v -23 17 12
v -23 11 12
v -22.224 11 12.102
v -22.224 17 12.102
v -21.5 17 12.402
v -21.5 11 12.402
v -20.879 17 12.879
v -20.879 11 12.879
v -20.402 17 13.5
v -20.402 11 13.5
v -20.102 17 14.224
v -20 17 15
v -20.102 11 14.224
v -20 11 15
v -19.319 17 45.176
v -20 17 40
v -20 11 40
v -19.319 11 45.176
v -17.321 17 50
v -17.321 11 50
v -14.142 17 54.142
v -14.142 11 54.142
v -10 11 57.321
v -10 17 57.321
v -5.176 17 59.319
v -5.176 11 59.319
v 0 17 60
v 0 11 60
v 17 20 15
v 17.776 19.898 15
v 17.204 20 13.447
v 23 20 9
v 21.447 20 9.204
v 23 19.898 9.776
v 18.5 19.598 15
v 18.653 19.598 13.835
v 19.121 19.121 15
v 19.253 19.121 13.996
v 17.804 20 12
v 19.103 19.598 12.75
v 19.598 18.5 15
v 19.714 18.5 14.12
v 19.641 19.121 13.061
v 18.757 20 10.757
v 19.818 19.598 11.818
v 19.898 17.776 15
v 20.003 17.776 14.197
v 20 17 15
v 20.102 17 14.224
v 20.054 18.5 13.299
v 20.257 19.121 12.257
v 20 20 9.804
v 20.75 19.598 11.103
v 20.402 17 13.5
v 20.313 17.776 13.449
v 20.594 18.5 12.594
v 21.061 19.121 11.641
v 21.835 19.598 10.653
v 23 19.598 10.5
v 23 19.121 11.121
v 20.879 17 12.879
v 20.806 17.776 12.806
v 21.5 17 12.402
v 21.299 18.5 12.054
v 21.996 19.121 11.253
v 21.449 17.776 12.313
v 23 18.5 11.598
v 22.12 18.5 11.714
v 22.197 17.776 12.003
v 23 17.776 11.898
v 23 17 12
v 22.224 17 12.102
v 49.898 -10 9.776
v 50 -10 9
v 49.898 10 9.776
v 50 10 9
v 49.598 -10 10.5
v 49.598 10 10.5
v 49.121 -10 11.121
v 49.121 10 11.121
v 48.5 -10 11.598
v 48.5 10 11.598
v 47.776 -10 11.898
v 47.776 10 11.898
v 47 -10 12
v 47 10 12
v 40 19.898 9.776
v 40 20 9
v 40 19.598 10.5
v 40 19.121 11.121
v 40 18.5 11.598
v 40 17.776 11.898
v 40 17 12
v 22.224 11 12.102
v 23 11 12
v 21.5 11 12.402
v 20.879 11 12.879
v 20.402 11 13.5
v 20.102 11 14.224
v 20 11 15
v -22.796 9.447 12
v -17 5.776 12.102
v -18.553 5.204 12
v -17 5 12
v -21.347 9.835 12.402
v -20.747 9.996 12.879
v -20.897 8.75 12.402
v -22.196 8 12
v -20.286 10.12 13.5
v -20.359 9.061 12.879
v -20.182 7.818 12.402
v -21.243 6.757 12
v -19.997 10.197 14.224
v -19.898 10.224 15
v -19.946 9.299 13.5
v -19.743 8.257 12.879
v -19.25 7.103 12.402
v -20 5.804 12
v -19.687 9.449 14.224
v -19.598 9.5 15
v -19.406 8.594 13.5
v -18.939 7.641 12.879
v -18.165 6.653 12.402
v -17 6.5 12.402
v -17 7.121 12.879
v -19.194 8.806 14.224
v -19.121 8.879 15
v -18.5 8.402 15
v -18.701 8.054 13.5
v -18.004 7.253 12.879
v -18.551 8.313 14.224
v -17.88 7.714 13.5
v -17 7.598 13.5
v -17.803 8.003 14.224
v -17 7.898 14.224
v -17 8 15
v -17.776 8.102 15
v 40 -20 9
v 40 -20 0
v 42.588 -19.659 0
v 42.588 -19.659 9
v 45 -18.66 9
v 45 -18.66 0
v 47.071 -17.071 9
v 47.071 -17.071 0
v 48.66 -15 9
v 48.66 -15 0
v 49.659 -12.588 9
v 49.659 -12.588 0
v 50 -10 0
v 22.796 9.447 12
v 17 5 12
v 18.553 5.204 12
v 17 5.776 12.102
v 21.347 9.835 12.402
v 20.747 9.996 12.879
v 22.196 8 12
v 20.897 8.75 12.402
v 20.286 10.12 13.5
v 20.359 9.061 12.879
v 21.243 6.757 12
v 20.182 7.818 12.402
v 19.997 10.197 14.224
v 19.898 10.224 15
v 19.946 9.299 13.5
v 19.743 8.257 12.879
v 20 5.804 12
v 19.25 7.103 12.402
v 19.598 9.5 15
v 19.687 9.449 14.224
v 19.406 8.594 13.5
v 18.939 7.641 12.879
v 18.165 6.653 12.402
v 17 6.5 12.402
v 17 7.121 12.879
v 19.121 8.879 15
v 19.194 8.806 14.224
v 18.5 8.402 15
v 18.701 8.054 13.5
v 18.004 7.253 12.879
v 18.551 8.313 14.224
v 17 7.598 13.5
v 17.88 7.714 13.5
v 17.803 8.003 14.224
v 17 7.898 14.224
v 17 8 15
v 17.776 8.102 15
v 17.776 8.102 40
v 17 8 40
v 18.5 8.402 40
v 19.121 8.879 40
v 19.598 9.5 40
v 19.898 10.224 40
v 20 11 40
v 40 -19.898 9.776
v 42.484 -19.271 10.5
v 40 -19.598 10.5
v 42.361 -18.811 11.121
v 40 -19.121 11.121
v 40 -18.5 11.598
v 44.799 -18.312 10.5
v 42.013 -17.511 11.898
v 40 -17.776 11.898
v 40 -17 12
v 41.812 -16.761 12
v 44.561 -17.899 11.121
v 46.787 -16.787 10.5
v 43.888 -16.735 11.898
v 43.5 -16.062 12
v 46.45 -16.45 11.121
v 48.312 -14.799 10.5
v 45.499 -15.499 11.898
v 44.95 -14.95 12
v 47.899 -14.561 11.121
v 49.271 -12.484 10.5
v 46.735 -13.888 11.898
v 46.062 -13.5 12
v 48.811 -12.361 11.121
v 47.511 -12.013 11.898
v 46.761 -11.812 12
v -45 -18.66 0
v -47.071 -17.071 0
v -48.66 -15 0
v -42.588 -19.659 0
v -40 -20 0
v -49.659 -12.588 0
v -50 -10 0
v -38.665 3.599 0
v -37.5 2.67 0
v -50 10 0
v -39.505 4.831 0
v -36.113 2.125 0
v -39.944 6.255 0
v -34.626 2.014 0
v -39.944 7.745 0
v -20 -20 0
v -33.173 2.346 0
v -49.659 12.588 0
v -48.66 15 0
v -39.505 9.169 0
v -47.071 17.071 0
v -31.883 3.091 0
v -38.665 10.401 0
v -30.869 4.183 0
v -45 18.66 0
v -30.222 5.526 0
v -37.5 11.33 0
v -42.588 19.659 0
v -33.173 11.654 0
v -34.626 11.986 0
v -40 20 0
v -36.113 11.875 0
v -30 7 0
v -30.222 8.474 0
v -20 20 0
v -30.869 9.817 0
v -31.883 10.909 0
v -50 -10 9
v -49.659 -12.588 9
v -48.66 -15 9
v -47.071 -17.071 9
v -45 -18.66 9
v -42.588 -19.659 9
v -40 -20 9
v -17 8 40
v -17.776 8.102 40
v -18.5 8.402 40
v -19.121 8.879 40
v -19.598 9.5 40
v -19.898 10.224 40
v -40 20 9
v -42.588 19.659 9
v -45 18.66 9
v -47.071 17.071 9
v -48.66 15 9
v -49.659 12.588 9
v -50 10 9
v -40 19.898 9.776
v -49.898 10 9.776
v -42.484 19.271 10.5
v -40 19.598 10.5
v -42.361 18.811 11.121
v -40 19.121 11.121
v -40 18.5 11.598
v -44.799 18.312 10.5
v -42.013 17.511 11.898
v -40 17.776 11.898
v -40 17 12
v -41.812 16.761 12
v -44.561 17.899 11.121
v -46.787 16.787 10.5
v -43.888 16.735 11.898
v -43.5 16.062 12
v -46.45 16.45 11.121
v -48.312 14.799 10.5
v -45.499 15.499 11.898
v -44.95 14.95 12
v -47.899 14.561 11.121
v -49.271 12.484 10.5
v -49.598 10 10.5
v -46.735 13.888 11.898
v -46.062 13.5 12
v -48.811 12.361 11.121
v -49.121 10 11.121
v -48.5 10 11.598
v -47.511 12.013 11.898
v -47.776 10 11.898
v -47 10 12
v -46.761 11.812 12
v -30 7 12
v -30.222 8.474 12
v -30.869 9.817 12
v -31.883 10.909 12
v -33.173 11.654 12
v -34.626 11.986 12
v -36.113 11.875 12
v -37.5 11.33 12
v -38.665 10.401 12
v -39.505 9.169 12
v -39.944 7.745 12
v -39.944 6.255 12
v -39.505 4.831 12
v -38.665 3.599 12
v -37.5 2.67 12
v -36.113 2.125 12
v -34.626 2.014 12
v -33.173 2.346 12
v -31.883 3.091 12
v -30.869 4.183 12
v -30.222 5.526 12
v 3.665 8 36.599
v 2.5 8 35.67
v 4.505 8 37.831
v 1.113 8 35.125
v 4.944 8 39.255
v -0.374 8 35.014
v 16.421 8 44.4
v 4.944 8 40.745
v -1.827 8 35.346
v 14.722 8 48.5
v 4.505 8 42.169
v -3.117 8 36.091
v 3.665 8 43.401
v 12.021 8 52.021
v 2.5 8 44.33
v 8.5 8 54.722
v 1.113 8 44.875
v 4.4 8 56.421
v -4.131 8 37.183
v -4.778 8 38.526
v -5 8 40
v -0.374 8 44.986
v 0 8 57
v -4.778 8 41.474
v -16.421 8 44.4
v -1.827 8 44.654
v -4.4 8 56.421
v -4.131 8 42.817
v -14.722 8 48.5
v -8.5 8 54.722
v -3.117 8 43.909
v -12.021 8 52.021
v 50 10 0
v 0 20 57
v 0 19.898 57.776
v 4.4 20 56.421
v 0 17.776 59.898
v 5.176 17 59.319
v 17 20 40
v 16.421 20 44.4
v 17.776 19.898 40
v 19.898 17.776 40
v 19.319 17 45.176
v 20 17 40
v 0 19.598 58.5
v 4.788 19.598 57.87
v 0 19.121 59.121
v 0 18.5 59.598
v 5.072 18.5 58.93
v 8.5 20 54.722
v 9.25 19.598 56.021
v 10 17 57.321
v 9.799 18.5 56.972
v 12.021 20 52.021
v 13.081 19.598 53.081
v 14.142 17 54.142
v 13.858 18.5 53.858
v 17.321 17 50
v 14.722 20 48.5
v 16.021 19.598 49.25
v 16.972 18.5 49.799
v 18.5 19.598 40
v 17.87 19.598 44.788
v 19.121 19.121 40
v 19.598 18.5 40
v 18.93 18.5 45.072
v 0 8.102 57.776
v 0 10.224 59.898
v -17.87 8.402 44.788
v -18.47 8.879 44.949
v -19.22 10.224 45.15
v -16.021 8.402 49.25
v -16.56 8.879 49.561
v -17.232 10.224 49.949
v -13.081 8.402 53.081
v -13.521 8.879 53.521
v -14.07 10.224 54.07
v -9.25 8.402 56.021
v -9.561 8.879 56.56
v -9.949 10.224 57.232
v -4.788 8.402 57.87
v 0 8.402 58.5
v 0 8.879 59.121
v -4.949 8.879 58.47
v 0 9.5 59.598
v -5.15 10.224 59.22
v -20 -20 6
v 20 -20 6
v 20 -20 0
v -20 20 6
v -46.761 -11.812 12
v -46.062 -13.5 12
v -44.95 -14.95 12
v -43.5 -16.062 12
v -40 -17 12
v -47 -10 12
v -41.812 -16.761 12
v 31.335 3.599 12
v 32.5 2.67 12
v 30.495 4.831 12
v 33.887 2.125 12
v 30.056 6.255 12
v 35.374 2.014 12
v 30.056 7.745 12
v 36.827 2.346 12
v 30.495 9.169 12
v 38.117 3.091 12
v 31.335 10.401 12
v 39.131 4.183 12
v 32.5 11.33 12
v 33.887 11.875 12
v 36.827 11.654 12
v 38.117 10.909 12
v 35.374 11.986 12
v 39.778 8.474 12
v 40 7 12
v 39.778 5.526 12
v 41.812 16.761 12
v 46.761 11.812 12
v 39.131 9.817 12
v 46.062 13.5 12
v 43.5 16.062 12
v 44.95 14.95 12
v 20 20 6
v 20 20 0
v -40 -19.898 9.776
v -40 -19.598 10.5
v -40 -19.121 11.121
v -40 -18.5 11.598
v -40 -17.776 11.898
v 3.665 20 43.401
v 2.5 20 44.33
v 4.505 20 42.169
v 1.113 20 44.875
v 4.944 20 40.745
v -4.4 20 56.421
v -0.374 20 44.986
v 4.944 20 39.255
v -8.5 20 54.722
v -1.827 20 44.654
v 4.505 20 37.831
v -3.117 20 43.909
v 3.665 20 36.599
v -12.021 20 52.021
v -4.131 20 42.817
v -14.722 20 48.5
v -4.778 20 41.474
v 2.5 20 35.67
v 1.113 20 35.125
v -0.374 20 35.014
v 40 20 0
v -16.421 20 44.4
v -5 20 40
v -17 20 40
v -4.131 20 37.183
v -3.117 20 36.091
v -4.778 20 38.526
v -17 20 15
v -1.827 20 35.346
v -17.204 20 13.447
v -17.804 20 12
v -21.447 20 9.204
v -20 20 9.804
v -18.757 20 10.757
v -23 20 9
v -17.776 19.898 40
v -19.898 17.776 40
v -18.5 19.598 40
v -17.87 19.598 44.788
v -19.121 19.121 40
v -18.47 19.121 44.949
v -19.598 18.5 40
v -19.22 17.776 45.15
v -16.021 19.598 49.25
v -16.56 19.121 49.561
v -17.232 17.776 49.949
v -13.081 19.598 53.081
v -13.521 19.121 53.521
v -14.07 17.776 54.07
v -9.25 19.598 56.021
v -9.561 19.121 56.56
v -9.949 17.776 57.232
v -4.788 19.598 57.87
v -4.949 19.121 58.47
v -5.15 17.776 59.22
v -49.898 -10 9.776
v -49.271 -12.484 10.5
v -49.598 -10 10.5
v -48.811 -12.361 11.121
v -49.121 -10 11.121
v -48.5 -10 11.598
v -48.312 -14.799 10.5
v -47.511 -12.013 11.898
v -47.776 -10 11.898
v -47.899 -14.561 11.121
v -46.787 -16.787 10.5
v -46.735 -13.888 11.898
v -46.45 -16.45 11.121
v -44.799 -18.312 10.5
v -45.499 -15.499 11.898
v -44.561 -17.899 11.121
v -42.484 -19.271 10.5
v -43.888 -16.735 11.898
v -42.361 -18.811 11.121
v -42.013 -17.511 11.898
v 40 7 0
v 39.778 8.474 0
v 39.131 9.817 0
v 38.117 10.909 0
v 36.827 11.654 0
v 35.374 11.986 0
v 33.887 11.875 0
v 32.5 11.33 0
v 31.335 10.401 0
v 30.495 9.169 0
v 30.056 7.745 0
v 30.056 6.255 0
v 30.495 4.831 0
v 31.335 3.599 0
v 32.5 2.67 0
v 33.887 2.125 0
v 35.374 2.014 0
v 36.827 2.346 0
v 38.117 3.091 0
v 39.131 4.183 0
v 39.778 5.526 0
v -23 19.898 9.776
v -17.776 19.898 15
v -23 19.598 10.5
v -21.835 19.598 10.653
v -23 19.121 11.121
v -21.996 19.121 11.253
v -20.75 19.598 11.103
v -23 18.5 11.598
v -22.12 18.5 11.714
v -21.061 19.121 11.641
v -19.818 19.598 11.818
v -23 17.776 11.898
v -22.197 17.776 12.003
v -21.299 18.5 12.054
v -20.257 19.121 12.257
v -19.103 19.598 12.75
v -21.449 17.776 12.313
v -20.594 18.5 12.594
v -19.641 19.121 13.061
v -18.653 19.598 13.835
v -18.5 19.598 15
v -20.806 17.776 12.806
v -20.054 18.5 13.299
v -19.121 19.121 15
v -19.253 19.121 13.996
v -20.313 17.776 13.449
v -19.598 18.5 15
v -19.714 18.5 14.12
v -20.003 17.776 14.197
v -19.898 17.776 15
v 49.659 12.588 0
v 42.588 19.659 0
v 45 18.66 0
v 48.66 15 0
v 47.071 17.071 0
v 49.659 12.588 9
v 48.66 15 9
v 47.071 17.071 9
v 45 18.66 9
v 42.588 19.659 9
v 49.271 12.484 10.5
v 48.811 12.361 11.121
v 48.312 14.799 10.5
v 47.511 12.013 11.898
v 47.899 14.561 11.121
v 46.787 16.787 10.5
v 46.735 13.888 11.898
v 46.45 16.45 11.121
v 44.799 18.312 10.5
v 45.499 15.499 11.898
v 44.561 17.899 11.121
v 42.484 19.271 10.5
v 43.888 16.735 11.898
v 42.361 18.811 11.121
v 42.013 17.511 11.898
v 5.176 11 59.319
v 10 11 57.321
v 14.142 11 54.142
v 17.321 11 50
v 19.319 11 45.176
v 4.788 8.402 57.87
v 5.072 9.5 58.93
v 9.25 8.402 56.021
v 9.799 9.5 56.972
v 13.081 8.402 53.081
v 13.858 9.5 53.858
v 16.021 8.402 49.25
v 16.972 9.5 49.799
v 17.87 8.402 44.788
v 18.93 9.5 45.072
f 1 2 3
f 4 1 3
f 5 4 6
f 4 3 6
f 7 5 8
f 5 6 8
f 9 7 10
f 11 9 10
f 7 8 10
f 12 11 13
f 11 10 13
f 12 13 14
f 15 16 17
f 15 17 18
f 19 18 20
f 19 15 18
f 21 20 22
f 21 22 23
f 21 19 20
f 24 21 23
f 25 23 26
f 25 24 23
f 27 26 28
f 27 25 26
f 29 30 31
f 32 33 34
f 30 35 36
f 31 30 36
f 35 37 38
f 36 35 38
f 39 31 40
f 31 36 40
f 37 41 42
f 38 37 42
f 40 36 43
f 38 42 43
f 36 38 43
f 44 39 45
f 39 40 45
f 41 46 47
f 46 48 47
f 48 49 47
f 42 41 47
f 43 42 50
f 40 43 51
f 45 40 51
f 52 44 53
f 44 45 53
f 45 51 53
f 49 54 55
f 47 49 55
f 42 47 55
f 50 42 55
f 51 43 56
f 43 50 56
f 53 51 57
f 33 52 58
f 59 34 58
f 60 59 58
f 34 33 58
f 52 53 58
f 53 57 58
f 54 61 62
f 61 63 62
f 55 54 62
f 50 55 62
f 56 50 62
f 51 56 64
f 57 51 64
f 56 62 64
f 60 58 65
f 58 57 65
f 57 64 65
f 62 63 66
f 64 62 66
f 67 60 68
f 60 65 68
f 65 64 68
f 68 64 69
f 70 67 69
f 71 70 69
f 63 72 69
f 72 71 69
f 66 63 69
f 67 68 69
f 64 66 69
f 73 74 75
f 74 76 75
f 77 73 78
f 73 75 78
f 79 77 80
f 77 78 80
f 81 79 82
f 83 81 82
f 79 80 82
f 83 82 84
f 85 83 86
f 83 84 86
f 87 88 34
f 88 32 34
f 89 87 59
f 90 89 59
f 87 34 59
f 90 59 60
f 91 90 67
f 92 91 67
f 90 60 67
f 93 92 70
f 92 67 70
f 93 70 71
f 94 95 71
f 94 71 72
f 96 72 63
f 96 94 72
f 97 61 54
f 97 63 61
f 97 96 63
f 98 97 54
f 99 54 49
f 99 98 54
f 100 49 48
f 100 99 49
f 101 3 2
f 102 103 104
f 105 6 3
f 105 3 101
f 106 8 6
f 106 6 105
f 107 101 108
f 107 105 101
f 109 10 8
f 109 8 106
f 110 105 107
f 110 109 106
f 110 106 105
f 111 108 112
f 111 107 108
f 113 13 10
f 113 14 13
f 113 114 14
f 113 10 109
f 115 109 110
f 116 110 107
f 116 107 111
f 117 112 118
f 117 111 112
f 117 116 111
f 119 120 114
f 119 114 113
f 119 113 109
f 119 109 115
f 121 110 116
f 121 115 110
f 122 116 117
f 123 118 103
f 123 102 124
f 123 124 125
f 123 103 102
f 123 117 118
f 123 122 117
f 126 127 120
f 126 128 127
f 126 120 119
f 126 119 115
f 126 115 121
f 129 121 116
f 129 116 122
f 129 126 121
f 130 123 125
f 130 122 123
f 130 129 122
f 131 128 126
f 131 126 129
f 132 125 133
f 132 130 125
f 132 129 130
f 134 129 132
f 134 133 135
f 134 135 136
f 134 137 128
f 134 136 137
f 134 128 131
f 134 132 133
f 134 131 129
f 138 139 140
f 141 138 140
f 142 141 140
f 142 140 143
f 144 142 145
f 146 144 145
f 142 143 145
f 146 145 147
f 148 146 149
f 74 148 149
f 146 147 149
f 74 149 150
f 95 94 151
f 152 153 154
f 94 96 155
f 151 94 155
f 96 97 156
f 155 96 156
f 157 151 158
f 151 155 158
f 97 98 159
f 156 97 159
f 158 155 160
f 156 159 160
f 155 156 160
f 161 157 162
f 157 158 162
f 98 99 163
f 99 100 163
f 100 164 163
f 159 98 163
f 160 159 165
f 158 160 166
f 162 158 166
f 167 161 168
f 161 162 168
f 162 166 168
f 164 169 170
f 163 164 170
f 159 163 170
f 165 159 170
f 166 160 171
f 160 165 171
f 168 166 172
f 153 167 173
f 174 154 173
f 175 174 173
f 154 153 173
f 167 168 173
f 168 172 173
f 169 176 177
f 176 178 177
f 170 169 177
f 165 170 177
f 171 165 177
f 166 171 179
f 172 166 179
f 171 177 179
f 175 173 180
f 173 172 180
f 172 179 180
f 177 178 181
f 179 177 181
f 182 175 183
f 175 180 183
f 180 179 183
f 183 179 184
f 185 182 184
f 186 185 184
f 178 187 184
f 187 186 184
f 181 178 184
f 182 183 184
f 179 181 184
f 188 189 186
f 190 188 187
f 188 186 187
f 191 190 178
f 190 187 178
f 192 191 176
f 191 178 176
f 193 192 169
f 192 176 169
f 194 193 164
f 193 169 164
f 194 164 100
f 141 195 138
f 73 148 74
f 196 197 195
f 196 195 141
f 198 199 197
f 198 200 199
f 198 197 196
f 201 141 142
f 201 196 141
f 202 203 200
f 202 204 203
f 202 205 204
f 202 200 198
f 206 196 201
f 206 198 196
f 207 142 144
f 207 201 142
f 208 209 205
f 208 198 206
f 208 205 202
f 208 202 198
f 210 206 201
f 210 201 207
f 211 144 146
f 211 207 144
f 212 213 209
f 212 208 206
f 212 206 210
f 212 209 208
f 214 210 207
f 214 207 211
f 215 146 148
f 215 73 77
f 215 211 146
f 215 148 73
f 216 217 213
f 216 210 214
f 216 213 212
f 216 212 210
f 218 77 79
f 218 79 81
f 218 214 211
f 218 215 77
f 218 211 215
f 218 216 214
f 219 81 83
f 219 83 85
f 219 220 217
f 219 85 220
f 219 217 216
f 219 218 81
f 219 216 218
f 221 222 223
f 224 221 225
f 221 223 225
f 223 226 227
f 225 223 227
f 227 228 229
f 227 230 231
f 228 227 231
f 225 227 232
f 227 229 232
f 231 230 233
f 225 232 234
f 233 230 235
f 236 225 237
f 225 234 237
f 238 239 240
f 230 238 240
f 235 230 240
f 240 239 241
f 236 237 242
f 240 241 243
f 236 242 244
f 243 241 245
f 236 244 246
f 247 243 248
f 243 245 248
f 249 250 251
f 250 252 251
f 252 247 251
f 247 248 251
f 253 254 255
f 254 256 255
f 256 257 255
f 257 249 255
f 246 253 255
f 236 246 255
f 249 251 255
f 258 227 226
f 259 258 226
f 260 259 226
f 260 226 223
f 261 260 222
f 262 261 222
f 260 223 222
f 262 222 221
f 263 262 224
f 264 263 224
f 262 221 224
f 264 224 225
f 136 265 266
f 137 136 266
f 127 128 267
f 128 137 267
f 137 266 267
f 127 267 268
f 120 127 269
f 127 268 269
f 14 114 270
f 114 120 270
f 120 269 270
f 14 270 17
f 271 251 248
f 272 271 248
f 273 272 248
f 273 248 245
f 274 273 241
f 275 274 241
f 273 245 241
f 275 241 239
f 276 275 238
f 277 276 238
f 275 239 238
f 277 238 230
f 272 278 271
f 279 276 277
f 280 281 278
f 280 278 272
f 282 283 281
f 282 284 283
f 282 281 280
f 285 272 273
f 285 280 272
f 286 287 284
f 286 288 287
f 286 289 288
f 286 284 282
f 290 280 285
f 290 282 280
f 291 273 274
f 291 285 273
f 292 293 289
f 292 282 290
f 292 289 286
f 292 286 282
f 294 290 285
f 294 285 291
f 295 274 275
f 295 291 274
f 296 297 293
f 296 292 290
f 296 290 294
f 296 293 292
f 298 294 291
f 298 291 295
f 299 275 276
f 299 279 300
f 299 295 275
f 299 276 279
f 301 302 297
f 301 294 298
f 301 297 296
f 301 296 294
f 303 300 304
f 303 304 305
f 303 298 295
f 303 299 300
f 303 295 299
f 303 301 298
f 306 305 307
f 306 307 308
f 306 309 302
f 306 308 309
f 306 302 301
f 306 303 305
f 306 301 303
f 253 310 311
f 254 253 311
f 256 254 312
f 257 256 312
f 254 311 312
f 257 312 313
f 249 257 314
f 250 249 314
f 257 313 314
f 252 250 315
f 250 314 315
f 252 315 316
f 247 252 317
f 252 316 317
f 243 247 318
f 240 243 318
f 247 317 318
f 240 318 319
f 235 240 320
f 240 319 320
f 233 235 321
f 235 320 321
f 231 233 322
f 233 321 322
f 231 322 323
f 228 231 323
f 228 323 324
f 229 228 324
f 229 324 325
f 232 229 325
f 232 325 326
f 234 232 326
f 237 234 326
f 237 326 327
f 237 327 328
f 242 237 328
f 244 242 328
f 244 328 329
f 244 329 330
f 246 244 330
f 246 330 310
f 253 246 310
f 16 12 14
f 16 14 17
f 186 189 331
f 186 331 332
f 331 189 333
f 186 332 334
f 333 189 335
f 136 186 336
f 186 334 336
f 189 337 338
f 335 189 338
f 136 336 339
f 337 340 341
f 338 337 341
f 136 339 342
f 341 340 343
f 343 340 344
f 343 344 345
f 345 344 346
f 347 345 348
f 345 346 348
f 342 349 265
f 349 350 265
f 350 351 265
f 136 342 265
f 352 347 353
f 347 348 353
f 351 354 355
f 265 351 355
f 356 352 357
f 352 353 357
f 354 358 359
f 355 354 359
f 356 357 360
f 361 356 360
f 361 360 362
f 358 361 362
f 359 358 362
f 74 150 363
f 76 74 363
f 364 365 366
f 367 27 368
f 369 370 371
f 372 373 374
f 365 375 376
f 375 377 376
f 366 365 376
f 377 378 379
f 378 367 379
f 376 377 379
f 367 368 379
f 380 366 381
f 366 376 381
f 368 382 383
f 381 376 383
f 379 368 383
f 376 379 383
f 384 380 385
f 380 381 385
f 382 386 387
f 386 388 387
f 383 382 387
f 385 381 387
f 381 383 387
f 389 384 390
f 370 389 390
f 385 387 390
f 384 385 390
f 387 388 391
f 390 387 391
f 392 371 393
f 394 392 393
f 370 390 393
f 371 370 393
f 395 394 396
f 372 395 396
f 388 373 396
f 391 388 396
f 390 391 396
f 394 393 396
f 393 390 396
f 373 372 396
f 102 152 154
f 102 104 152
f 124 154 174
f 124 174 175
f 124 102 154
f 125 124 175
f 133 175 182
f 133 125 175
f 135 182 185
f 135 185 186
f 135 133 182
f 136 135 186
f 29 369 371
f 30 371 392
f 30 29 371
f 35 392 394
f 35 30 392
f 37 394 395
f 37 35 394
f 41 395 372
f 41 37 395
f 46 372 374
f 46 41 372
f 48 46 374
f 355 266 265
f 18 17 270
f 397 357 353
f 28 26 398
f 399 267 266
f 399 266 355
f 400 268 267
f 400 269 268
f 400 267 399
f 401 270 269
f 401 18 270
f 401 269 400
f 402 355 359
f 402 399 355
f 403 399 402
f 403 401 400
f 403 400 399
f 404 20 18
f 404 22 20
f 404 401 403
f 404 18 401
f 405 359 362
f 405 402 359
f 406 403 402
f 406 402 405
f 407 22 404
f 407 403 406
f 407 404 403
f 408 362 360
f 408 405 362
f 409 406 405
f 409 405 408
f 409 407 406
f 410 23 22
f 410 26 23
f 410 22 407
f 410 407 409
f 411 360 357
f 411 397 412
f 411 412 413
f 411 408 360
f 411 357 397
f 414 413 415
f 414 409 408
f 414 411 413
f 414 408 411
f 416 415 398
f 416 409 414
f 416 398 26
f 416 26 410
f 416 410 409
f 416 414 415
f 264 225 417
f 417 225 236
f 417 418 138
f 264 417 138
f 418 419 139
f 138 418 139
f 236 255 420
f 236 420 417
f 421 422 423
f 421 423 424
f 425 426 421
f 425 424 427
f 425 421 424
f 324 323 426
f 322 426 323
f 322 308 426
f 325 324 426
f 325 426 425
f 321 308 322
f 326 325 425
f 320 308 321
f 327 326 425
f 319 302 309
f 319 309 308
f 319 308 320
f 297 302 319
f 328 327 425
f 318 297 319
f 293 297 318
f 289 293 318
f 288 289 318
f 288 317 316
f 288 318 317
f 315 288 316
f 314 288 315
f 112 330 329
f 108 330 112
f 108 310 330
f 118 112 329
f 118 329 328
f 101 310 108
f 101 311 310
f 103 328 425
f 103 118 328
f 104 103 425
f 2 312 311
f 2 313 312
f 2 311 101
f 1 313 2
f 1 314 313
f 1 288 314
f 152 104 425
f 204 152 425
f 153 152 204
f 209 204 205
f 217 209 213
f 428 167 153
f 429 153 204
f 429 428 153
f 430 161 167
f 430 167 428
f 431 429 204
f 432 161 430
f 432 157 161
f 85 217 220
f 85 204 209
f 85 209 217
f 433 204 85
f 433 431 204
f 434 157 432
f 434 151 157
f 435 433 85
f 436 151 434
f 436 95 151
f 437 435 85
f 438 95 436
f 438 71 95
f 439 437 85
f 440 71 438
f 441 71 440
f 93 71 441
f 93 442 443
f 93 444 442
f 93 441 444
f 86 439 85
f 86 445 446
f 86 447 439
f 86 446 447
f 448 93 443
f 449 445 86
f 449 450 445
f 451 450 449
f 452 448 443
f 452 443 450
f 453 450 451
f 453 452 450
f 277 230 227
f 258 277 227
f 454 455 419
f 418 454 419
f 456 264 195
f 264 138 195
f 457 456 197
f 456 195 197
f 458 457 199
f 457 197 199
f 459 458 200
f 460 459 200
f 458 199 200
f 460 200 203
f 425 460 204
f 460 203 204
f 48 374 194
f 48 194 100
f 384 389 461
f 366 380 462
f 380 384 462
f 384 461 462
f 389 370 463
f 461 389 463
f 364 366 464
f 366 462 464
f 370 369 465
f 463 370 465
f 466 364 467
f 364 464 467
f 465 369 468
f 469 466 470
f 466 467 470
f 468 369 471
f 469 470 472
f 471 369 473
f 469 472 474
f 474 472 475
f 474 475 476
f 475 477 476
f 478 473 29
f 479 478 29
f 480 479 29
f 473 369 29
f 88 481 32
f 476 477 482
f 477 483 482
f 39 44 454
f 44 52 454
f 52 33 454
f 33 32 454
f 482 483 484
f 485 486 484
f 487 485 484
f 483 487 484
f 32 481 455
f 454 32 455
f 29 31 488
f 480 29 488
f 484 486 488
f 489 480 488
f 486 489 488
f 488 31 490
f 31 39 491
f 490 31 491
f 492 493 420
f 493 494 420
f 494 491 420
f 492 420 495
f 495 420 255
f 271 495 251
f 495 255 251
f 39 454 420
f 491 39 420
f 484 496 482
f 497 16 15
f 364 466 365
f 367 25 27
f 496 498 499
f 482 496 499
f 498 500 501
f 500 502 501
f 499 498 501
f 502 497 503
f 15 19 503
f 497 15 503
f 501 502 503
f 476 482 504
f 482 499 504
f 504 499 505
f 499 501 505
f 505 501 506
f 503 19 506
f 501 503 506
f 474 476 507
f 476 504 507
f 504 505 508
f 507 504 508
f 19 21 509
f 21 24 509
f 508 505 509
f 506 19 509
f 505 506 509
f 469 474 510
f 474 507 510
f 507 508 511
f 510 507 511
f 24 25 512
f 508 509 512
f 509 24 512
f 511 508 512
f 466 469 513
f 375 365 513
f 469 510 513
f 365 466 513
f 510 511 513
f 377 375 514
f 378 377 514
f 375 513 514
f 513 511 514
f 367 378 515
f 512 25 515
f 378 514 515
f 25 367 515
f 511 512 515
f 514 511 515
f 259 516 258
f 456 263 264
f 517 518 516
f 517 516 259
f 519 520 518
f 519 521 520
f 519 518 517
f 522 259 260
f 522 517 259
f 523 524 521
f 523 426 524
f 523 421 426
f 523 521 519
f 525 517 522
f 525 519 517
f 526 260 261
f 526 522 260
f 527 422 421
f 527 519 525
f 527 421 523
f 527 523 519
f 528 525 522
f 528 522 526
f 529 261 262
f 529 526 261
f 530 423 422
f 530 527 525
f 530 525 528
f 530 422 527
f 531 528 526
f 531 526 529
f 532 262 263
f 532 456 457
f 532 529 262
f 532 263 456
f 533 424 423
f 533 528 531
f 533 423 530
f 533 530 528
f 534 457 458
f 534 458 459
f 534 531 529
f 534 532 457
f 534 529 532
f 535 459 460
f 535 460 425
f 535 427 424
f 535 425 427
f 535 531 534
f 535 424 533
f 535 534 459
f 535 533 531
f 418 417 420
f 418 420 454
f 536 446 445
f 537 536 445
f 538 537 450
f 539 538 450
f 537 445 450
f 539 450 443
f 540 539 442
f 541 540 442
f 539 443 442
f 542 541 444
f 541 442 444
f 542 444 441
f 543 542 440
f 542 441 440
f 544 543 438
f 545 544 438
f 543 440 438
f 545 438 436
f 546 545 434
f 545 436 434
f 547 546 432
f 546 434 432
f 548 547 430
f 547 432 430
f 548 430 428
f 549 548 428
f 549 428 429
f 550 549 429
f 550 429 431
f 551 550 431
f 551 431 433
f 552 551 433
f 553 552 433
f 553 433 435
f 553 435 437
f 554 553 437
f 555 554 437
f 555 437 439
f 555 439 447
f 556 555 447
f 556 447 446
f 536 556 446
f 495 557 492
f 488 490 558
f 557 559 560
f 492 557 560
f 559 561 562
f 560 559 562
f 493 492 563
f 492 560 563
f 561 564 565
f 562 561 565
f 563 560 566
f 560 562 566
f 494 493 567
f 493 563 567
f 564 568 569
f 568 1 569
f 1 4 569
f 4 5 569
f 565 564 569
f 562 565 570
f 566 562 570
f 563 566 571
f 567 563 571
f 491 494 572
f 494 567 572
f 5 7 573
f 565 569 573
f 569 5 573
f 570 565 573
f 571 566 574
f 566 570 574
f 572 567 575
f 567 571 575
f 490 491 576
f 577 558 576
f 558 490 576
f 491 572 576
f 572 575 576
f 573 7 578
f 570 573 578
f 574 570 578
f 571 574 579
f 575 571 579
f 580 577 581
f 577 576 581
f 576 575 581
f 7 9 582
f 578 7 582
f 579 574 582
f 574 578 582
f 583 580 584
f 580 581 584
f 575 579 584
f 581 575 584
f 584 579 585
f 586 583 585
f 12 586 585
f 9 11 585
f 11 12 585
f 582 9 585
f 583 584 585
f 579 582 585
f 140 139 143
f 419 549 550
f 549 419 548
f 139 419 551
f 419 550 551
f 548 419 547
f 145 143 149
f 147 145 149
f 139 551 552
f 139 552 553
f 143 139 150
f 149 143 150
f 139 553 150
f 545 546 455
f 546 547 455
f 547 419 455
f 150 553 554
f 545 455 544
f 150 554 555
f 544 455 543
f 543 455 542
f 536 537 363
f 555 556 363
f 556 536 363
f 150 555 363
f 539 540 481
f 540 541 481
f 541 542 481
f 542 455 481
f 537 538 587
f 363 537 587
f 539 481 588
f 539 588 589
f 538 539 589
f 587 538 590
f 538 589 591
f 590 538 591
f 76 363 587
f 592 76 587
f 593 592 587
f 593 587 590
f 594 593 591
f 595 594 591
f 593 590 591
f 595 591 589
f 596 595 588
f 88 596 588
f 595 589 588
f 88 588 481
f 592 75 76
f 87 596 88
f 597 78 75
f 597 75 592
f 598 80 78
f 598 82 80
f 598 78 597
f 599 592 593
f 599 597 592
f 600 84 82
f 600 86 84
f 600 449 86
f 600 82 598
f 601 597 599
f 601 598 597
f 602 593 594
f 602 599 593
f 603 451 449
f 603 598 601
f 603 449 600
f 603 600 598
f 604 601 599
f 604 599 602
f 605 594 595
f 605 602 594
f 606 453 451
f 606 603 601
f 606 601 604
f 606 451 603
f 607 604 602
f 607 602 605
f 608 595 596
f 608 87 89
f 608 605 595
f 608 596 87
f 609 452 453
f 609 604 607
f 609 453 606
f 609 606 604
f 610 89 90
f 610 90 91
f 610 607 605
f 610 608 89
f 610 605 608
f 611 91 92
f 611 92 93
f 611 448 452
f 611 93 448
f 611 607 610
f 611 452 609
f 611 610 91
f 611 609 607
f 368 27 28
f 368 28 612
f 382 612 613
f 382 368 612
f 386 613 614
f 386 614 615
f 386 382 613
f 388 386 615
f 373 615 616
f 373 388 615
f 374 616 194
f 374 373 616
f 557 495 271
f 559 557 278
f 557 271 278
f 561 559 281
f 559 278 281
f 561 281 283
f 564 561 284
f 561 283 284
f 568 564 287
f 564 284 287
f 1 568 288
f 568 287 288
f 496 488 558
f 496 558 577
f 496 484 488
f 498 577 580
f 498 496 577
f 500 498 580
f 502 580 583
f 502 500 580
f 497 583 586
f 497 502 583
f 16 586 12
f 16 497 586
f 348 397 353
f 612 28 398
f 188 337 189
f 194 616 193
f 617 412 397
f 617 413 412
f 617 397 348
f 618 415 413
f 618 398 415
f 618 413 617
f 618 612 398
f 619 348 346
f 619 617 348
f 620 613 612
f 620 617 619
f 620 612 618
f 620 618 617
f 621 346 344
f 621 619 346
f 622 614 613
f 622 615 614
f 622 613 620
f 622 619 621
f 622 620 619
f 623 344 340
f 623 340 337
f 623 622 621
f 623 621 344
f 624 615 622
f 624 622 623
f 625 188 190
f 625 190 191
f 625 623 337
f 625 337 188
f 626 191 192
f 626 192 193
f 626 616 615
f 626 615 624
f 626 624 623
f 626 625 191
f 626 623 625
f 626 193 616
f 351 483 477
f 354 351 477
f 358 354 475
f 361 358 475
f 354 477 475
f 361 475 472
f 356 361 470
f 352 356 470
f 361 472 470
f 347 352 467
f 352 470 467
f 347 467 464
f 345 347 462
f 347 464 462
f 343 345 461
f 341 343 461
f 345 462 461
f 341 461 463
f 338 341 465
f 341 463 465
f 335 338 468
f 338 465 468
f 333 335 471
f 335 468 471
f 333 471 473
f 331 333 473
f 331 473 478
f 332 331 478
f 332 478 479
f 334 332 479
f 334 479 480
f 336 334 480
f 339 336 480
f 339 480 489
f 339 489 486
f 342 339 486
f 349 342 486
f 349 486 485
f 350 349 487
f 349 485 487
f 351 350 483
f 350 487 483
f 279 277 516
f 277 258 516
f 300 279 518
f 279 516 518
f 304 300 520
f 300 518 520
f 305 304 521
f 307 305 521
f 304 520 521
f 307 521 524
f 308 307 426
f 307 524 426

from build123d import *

# Parameters (mm, degrees)
F1_DEPTH = 12
F2_W     = 40
F2_H     = 40
F3_DEPTH = 6
F4_R     = 5
F5_DEPTH = 25
F6_R     = 5
F7_DEPTH = 12
F9_R     = 3


with BuildPart() as f1:
    # F0 (on Top) → F1 (new body)
    with BuildSketch(Plane.XY):
        with BuildLine():
            Line((40, 20), (-40, 20))
            ThreePointArc((-40, 20), (-47.0710678119, 17.0710678119), (-50, 10))
            Line((-50, 10), (-50, -10))
            ThreePointArc((-50, -10), (-47.0710678119, -17.0710678119), (-40, -20))
            Line((-40, -20), (40, -20))
            ThreePointArc((40, -20), (47.0710678119, -17.0710678119), (50, -10))
            Line((50, -10), (50, 10))
            ThreePointArc((50, 10), (47.0710678119, 17.0710678119), (40, 20))
        make_face()
    extrude(amount=F1_DEPTH)

    # F2 (on face) → F3 (cut)
    with BuildSketch(Plane(origin=(0, 0, 0), x_dir=(1, 0, 0), z_dir=(0, 0, -1))):
        Rectangle(F2_W, F2_H)
    extrude(amount=-F3_DEPTH, mode=Mode.SUBTRACT)

    # F4 (on face) → F5 (cut)
    with BuildSketch(Plane.XY.offset(12)):
        with Locations((-35, 7)):
            Circle(F4_R)
        with Locations((35, 7)):
            Circle(F4_R)
    extrude(amount=-F5_DEPTH, mode=Mode.SUBTRACT)


with BuildPart() as f7:
    # F6 (on face) → F7 (new body)
    with BuildSketch(Plane(origin=(0, 20, 0), x_dir=(-1, 0, 0), z_dir=(0, 1, 0))):
        with BuildLine():
            Line((-20, 12), (20, 12))
            Line((20, 12), (20, 40))
            ThreePointArc((20, 40), (14.1421356237, 54.1421356237), (0, 60))
            ThreePointArc((0, 60), (-14.1421356237, 54.1421356237), (-20, 40))
            Line((-20, 40), (-20, 12))
        make_face()
        with Locations((0, 40)):
            Circle(F6_R, mode=Mode.SUBTRACT)
    extrude(amount=-F7_DEPTH)

    # F8: union F1
    add(f1.part)

    # F9
    f9_edges = [f7.edges().sort_by_distance(p)[0] for p in [
        (-20, 20, 26),
        (-20, 14, 12),
        (-30, 20, 12),
        (0, 8, 12),
        (20, 8, 26),
        (20, 14, 12),
    ]]
    fillet(f9_edges, radius=F9_R)


solid = f7.part
